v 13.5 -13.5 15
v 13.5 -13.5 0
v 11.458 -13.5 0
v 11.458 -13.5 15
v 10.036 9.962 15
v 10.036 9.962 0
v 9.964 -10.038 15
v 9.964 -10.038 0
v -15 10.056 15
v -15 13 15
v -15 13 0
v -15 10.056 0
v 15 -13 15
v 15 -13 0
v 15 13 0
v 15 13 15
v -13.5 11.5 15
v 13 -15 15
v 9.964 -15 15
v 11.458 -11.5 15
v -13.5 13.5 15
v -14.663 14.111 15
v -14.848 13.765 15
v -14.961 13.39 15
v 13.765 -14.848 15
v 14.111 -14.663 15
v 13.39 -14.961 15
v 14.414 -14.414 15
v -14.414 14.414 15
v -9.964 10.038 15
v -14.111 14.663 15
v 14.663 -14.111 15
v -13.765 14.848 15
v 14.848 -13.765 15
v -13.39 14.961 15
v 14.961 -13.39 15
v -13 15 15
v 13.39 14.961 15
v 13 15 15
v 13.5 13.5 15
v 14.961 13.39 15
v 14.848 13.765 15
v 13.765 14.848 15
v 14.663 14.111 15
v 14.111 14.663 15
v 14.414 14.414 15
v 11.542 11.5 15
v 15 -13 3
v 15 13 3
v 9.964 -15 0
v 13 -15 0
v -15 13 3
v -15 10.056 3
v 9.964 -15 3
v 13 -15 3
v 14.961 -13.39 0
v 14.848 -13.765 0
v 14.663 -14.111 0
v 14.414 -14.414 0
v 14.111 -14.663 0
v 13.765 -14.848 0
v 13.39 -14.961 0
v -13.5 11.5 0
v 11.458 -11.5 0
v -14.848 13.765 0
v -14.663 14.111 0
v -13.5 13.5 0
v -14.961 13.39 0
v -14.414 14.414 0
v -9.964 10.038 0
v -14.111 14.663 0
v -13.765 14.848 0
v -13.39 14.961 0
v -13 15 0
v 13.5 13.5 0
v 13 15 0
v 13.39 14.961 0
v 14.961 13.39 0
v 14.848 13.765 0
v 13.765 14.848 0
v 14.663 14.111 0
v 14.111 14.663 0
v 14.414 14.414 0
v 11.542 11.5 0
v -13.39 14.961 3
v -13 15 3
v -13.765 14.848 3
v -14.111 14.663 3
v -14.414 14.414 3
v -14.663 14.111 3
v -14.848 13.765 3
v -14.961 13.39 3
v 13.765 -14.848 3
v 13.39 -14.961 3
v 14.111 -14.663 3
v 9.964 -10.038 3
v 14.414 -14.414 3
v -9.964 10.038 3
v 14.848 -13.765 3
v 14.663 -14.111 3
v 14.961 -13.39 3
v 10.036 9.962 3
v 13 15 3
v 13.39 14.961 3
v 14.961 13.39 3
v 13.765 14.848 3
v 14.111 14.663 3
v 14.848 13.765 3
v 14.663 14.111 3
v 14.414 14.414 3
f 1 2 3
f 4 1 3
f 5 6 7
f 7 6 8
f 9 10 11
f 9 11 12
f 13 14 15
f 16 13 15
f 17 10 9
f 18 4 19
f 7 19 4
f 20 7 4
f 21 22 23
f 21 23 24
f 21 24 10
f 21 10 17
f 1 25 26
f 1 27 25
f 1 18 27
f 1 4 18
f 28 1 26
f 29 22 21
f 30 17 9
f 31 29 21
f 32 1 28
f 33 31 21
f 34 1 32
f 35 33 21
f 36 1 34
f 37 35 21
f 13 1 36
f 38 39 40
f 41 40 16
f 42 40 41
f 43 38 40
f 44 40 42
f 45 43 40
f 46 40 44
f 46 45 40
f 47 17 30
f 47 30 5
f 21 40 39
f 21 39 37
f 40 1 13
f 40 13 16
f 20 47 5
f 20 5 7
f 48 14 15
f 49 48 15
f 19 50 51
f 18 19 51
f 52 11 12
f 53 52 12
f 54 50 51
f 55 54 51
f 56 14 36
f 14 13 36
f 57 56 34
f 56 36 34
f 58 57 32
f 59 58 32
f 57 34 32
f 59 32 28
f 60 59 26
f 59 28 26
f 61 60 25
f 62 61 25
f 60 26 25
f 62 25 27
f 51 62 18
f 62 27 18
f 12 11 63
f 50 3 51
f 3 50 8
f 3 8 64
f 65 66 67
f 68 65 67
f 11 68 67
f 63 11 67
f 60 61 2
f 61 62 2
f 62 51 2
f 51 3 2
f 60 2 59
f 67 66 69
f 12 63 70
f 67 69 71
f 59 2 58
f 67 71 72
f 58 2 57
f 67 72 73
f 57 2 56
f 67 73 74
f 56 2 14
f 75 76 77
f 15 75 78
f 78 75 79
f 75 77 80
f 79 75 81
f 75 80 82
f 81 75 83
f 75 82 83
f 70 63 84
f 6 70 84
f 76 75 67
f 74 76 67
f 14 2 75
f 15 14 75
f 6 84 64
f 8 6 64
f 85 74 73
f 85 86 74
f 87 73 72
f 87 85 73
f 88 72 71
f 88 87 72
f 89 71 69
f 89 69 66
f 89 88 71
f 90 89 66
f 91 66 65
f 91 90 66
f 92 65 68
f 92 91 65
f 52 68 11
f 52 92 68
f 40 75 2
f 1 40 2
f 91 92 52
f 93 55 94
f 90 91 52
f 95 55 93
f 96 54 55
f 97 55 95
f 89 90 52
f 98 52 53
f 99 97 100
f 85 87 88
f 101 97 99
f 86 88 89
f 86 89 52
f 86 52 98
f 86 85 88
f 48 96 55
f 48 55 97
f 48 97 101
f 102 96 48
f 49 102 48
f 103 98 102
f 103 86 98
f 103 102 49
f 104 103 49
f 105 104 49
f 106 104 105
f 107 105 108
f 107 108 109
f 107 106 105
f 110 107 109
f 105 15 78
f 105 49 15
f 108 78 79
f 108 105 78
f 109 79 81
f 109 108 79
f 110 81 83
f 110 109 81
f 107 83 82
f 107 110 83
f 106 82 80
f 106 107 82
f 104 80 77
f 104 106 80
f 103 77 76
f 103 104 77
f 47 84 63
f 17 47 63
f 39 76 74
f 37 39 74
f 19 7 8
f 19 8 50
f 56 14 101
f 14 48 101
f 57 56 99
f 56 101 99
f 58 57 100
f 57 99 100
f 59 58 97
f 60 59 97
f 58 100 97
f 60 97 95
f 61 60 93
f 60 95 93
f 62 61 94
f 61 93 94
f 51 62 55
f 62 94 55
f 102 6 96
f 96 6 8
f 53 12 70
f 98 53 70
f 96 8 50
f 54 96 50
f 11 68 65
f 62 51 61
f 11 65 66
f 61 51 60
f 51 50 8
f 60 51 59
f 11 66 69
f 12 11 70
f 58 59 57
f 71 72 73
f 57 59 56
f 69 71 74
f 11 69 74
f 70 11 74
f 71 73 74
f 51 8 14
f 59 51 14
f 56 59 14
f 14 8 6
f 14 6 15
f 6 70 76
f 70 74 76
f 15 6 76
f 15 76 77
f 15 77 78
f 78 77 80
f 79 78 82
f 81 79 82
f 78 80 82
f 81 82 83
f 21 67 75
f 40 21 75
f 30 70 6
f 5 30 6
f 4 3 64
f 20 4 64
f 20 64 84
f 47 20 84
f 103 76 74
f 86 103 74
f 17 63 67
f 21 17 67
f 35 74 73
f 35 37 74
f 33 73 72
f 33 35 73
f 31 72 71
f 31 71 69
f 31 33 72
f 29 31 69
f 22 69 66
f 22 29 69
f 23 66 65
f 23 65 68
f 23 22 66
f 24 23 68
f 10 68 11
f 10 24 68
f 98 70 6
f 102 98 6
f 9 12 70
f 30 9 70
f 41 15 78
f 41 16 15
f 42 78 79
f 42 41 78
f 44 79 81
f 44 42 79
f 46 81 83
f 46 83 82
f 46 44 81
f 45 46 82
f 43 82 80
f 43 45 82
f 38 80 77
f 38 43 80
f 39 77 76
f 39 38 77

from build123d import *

# Parameters (mm, degrees)
F1_DEPTH = 3
F2_DEPTH = 15
F3_R     = 2
F4_R     = 2


with BuildPart() as f1:
    # F0 (on Top) → F1 (new body)
    with BuildSketch(Plane.XY):
        Polygon((14.999924, -14.999924), (14.999924, 14.999924), (-14.999924, 14.999924), (-14.999924, 10.056472), (-9.963582, 10.03751), (10.036125, 9.962208), (9.963582, -10.03751), (9.963582, -14.999924), align=None)
        Polygon((-13.499924, 11.499924), (-13.499924, 13.499924), (13.499924, 13.499924), (13.499924, -13.499924), (11.458288, -13.499924), (11.458288, -11.499924), (11.541712, 11.499924), (-11.458288, 11.499924), align=None, mode=Mode.SUBTRACT)
        Polygon((13.499924, 13.499924), (-13.499924, 13.499924), (-13.499924, 11.499924), (-11.458288, 11.499924), (11.541712, 11.499924), (11.458288, -11.499924), (11.458288, -13.499924), (13.499924, -13.499924), align=None)
    extrude(amount=F1_DEPTH)

    # F4
    f4_edges = [f1.edges().sort_by_distance(p)[0] for p in [
        (14.999924, 14.999924, 1.5),
        (14.999924, -14.999924, 1.5),
        (-14.999924, 14.999924, 1.5),
    ]]
    fillet(f4_edges, radius=F4_R)


with BuildPart() as f2:
    # F0 (on Top) → F2 (new body)
    with BuildSketch(Plane.XY):
        Polygon((14.999924, -14.999924), (14.999924, 14.999924), (-14.999924, 14.999924), (-14.999924, 10.056472), (-9.963582, 10.03751), (10.036125, 9.962208), (9.963582, -10.03751), (9.963582, -14.999924), align=None)
        Polygon((-13.499924, 11.499924), (-13.499924, 13.499924), (13.499924, 13.499924), (13.499924, -13.499924), (11.458288, -13.499924), (11.458288, -11.499924), (11.541712, 11.499924), (-11.458288, 11.499924), align=None, mode=Mode.SUBTRACT)
    extrude(amount=F2_DEPTH)

    # F3
    f3_edges = [f2.edges().sort_by_distance(p)[0] for p in [
        (14.999924, -14.999924, 7.5),
        (-14.999924, 14.999924, 7.5),
        (14.999924, 14.999924, 7.5),
    ]]
    fillet(f3_edges, radius=F3_R)


solid = Compound([f1.part, f2.part])
